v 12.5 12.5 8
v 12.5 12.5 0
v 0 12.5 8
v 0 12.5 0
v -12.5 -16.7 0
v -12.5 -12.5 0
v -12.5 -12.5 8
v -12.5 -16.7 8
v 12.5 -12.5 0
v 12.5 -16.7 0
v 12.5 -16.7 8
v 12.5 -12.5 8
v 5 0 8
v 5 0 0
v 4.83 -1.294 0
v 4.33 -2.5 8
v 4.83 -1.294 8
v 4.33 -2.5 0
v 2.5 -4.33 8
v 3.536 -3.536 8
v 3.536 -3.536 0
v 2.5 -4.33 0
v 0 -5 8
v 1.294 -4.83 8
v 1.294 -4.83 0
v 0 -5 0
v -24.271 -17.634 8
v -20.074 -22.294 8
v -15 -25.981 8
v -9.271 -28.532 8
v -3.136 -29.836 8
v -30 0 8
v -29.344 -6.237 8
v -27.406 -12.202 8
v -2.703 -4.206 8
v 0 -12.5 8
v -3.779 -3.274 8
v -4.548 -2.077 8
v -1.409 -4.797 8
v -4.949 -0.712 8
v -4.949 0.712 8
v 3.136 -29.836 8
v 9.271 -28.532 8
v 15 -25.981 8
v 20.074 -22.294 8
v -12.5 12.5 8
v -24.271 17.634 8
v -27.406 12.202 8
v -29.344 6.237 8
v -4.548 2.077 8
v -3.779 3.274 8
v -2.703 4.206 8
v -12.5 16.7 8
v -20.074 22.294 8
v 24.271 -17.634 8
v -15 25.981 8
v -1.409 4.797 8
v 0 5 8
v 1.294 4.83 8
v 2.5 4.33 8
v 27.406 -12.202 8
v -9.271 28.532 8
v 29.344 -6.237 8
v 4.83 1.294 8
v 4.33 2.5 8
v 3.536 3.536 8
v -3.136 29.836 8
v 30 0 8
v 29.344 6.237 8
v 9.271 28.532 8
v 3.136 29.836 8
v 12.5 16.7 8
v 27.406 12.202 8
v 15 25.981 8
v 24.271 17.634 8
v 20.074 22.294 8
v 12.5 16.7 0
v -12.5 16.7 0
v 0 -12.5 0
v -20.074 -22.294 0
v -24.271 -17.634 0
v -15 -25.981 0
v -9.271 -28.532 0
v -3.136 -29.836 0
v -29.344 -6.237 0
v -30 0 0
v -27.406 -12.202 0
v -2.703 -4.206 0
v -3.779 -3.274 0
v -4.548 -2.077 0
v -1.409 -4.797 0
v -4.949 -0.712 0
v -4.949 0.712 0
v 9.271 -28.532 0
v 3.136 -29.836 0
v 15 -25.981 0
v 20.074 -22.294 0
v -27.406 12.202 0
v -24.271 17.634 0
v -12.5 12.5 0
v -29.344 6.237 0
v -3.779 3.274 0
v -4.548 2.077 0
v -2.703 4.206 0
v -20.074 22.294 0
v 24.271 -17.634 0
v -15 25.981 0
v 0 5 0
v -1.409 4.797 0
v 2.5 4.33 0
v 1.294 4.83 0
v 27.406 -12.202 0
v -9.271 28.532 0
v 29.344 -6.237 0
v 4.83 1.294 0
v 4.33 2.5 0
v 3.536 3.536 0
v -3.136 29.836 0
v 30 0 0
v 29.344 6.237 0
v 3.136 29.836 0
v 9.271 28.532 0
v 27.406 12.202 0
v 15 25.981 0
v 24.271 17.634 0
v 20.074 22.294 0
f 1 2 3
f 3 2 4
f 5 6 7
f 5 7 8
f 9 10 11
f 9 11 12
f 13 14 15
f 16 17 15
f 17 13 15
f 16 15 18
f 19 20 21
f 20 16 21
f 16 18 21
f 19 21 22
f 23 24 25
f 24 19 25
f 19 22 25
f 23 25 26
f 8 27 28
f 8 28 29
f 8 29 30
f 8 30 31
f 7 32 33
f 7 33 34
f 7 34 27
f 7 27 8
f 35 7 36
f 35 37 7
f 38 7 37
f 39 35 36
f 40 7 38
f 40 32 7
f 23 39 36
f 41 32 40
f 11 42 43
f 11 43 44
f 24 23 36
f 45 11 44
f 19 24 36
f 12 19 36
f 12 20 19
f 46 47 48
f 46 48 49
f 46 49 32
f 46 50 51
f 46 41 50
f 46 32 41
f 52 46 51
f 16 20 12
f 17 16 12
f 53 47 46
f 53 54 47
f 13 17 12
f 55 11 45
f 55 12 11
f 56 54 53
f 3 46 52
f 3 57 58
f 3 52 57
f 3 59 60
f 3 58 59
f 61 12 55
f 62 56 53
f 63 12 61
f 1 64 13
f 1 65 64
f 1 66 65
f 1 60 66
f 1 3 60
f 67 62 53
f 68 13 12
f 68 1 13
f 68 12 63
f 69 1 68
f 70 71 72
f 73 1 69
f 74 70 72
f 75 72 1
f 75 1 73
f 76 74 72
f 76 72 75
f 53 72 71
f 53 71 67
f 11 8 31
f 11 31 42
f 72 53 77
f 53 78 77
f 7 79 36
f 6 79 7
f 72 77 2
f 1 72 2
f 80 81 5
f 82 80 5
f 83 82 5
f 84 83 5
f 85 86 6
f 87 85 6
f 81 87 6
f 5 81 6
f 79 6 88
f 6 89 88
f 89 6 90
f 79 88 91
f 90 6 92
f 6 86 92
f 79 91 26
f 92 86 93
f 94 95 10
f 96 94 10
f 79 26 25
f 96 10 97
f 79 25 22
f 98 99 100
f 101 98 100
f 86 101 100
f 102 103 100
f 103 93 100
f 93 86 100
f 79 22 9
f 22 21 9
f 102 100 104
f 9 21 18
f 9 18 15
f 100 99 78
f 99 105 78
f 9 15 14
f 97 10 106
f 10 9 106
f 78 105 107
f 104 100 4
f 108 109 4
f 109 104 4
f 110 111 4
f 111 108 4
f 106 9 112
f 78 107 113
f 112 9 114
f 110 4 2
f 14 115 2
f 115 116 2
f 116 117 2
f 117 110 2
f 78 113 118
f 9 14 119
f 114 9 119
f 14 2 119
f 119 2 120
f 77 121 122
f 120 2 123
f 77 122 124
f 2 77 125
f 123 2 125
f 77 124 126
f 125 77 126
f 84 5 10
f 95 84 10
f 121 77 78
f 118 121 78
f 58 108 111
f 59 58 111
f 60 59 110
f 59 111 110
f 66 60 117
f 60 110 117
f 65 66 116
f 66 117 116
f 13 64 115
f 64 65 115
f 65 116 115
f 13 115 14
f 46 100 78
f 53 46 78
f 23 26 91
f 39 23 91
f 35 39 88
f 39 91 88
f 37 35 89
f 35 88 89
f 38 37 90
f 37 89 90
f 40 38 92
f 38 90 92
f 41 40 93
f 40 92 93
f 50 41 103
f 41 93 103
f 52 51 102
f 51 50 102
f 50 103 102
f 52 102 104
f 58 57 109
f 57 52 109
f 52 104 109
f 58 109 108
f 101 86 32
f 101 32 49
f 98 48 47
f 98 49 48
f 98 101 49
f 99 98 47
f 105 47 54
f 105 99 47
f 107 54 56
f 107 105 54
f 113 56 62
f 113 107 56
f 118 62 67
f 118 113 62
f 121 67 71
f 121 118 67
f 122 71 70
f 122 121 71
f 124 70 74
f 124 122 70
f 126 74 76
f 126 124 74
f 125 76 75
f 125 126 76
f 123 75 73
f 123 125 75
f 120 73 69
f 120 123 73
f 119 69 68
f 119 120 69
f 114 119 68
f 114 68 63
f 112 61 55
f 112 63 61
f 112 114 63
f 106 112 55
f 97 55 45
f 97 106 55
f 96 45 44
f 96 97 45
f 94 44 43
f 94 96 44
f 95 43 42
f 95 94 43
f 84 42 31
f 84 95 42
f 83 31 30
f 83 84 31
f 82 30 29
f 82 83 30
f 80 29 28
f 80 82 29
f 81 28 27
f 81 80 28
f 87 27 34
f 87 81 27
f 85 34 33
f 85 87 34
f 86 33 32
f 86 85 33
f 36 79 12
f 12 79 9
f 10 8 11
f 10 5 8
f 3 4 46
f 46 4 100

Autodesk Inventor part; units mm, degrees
ref_plane "YZ Plane" through (0, 0, 0) normal (1, 0, 0) x (0, 1, 0)
ref_plane "XZ Plane" through (0, 0, 0) normal (0, 1, 0) x (-1, 0, 0)
ref_plane "XY Plane" through (0, 0, 0) normal (0, 0, 1) x (1, 0, 0)
sketch "Boceto1" plane through (0, 0, 0) normal (0, 0, 1) x (1, 0, 0)
  arc A0 (30, 0) -> (-30, 0) centre (0, 0) ccw
  line L0 (5, 0) -> (30, 0)
  arc A1 (-30, 0) -> (30, 0) centre (0, 0) ccw
  circle A2 centre (0, 0) radius 5
  line L1 (0, 0) -> (0, 12.5)
  line L2 (0, 12.5) -> (-12.5, 12.5)
  line L3 (-12.5, 12.5) -> (-12.5, 16.7)
  line L4 (-12.5, 16.7) -> (12.5, 16.7)
  line L5 (12.5, 16.7) -> (12.5, 12.5)
  line L6 (12.5, 12.5) -> (0, 12.5)
  line L7 (0, 0) -> (0, -12.5)
  line L8 (0, -12.5) -> (-12.5, -12.5)
  line L9 (-12.5, -12.5) -> (-12.5, -16.7)
  line L10 (-12.5, -16.7) -> (12.5, -16.7)
  line L11 (12.5, -16.7) -> (12.5, -12.5)
  line L12 (0, -12.5) -> (12.5, -12.5)
  point P0 (0.3554, 29.9979)
  point P1 (0.3554, -29.9979)
  point P2 (-5, 0)
  dimension "d0" = 60
  dimension "d13" = 10
  dimension "d14" = 12.5
  dimension "d15" = 12.5
  dimension "d16" = 4.2
  dimension "d17" = 25
  dimension "d18" = 12.5
  dimension "d19" = 12.5
  dimension "d20" = 4.2
  dimension "d21" = 25
extrude "Extrusión2" add sketch "Boceto1" along normal blind 8
properties part number "leva00" material "Madera (abedul)"
